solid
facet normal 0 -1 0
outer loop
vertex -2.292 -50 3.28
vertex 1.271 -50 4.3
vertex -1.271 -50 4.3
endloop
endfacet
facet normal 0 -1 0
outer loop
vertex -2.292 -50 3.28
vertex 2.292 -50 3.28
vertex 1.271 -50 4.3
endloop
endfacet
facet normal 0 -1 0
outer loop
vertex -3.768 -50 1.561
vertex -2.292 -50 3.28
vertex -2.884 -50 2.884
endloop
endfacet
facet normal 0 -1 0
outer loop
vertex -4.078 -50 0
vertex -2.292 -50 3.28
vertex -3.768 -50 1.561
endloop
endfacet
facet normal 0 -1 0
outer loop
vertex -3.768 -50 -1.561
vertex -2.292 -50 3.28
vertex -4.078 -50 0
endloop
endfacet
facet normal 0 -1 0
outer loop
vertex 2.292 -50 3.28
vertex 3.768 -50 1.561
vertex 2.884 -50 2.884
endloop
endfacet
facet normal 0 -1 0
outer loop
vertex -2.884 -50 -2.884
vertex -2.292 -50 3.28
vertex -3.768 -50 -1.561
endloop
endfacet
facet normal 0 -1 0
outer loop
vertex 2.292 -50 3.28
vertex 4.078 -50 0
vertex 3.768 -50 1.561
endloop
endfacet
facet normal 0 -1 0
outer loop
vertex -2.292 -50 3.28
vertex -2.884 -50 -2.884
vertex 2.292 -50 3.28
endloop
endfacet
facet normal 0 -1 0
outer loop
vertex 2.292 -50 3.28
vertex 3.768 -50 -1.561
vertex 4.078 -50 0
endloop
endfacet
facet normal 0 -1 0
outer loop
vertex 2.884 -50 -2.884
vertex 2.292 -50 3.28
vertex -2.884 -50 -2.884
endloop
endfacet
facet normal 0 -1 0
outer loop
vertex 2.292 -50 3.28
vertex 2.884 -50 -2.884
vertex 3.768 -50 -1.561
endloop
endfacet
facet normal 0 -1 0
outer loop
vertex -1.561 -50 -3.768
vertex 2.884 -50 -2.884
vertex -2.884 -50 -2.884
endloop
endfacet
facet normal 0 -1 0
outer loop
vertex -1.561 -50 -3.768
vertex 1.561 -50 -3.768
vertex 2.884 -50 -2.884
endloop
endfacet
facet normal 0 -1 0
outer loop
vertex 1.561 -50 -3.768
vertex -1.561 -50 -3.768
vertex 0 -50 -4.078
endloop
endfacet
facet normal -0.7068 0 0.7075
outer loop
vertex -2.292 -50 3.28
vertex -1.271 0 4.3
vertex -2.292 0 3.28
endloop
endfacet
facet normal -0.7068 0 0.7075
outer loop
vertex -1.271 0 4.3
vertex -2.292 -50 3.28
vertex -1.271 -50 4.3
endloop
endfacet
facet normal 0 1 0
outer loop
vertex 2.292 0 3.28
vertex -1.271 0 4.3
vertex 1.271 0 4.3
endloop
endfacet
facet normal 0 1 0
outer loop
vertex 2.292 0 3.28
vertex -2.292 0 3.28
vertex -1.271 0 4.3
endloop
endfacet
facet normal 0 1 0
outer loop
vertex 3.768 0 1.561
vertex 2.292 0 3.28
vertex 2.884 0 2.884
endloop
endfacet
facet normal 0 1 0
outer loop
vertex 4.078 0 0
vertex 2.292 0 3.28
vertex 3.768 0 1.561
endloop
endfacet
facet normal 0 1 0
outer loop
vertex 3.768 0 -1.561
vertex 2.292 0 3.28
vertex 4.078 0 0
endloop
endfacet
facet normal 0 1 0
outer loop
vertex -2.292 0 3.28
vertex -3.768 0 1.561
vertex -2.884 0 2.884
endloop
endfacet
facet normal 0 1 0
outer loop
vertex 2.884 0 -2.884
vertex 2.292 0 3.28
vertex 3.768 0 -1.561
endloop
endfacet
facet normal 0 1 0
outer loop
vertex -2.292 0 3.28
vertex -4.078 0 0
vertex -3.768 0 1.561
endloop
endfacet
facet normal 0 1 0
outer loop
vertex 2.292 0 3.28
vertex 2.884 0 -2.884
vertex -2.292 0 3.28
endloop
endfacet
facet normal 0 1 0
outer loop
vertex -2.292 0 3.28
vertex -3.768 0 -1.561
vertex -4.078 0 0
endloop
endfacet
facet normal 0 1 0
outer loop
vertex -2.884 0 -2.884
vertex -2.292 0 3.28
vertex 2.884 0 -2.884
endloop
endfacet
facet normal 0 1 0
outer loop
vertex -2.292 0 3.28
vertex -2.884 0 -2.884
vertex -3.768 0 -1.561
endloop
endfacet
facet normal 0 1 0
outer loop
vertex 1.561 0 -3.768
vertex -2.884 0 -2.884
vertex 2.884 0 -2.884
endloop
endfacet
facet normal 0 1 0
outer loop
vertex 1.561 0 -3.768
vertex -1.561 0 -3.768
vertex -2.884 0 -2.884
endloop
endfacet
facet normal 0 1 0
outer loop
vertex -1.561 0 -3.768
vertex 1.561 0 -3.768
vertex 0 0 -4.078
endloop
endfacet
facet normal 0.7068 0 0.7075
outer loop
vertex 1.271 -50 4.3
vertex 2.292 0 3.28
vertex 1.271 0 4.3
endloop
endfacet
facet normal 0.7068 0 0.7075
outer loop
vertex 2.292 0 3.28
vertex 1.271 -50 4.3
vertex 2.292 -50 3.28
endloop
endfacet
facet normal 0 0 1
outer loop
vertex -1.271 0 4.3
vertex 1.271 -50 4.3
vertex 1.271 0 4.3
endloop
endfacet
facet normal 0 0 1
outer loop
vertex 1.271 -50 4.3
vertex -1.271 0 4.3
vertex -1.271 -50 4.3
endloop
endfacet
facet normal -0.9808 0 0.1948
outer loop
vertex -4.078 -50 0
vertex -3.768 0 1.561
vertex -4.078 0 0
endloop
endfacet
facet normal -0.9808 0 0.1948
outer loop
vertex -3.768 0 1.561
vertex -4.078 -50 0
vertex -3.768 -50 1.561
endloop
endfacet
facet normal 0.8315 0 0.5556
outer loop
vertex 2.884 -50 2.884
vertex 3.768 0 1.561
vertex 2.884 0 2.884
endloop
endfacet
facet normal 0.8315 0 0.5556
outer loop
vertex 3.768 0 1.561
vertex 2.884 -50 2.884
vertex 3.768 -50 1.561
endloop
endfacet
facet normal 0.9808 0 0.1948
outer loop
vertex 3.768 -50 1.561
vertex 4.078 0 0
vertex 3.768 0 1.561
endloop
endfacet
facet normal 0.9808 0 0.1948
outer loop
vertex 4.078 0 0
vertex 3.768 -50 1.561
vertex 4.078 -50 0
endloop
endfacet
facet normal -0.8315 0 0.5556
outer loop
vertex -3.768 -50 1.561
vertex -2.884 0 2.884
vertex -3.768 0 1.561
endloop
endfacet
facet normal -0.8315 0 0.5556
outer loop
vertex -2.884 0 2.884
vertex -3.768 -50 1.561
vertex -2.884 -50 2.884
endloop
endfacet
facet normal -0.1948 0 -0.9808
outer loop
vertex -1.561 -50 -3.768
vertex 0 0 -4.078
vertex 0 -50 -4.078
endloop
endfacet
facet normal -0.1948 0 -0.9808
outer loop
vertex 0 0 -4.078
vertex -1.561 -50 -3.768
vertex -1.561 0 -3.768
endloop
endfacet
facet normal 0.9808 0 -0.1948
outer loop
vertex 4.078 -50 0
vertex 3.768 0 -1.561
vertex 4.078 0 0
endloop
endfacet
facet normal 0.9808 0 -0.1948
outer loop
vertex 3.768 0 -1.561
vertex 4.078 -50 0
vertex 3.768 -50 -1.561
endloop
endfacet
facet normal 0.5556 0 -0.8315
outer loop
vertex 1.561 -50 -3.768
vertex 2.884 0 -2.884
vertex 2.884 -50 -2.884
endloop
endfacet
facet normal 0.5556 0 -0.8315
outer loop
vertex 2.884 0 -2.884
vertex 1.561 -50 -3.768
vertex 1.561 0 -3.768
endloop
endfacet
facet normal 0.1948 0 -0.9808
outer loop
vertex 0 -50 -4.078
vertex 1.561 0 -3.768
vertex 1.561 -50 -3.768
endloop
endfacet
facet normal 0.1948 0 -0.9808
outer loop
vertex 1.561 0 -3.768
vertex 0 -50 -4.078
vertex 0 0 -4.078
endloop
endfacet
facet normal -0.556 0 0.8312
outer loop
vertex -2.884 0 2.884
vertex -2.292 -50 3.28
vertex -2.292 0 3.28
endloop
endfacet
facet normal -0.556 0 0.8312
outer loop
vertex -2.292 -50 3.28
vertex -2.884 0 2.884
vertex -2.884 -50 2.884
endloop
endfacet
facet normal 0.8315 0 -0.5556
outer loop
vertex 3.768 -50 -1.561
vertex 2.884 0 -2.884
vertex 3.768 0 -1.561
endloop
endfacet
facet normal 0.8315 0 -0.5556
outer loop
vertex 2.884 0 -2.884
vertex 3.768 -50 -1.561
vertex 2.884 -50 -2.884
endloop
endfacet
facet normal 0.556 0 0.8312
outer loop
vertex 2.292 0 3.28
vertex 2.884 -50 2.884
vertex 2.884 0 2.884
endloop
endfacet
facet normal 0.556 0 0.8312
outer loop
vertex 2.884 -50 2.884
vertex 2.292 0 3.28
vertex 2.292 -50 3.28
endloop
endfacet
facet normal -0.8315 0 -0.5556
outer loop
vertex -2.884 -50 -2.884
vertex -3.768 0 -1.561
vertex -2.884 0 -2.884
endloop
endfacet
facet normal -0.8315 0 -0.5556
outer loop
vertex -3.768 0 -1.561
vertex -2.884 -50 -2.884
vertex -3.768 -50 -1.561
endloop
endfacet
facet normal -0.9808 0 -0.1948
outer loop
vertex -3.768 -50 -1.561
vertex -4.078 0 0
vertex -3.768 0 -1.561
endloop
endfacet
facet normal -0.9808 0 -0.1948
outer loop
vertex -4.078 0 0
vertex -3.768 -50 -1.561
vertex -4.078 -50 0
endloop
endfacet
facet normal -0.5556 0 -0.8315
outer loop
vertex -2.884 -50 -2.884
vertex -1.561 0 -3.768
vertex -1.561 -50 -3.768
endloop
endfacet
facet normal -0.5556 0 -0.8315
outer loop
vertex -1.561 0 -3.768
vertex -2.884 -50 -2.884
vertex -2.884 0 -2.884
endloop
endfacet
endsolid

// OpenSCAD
// file: polyhole_re.scad
// polyholes - correct diameter for printing holes
//
// See http://hydraraptor.blogspot.com/2011/02/polyholes.html
//
// inspired by Josef Prusa (Prusa i3)
//
// GNU GPL v3
// R.E. 2017.06



function polyhole_n(r) = max(round(4 * r),3);
function polyhole_radius(r) = r / cos (180 / polyhole_n(r));

module polyhole(h, r, center = false) {
    rotate([0,0,0])
        cylinder(h = h, r = polyhole_radius(r), center = center, $fn = polyhole_n(r));
}


//test
high=20;
radius=4;
cylinder(high,r=radius,center=false);
translate([-3*radius,0,0])
  polyhole(high,radius,center=false);
echo("<b>Radius=</b>",radius);
echo("<b>polyhole_rad_n=</b>",polyhole_n(radius));
echo("<b>polyhole_radius=</b>",polyhole_radius(radius));
// main file
// pushfit_hole - holes for rods
// corrected diameter 
// extension on top for printing without briding problems
//
// inspired by Josef Prusa (Prusa i3)
//
// GNU GPL v3
// R.E.

use <polyhole_re.scad>

module pushfit_hole(length,diameter,overhang_angle=60,bridge_distance=0.4){
    // for better printing 45° < overhang_angle < 90° 
  
  radius = diameter / 2;
     
  polyhole(length,radius,center=false);
  if (overhang_angle >= 45 && overhang_angle < 90)
    difference(){
      translate([0,polyhole_radius(radius) * (sin(overhang_angle) - 1 / sqrt(2) + cos(overhang_angle)),length/2]) rotate([0,0,45]) cube(size = [polyhole_radius(radius),polyhole_radius(radius),length], center = true);
    translate([0,5/4*radius+bridge_distance,length/2]) cube([radius ,radius/2,length+1], center = true);
 }
}


//test
rotate(a=[90,0,0])
  pushfit_hole(50,8,60,0.3);
